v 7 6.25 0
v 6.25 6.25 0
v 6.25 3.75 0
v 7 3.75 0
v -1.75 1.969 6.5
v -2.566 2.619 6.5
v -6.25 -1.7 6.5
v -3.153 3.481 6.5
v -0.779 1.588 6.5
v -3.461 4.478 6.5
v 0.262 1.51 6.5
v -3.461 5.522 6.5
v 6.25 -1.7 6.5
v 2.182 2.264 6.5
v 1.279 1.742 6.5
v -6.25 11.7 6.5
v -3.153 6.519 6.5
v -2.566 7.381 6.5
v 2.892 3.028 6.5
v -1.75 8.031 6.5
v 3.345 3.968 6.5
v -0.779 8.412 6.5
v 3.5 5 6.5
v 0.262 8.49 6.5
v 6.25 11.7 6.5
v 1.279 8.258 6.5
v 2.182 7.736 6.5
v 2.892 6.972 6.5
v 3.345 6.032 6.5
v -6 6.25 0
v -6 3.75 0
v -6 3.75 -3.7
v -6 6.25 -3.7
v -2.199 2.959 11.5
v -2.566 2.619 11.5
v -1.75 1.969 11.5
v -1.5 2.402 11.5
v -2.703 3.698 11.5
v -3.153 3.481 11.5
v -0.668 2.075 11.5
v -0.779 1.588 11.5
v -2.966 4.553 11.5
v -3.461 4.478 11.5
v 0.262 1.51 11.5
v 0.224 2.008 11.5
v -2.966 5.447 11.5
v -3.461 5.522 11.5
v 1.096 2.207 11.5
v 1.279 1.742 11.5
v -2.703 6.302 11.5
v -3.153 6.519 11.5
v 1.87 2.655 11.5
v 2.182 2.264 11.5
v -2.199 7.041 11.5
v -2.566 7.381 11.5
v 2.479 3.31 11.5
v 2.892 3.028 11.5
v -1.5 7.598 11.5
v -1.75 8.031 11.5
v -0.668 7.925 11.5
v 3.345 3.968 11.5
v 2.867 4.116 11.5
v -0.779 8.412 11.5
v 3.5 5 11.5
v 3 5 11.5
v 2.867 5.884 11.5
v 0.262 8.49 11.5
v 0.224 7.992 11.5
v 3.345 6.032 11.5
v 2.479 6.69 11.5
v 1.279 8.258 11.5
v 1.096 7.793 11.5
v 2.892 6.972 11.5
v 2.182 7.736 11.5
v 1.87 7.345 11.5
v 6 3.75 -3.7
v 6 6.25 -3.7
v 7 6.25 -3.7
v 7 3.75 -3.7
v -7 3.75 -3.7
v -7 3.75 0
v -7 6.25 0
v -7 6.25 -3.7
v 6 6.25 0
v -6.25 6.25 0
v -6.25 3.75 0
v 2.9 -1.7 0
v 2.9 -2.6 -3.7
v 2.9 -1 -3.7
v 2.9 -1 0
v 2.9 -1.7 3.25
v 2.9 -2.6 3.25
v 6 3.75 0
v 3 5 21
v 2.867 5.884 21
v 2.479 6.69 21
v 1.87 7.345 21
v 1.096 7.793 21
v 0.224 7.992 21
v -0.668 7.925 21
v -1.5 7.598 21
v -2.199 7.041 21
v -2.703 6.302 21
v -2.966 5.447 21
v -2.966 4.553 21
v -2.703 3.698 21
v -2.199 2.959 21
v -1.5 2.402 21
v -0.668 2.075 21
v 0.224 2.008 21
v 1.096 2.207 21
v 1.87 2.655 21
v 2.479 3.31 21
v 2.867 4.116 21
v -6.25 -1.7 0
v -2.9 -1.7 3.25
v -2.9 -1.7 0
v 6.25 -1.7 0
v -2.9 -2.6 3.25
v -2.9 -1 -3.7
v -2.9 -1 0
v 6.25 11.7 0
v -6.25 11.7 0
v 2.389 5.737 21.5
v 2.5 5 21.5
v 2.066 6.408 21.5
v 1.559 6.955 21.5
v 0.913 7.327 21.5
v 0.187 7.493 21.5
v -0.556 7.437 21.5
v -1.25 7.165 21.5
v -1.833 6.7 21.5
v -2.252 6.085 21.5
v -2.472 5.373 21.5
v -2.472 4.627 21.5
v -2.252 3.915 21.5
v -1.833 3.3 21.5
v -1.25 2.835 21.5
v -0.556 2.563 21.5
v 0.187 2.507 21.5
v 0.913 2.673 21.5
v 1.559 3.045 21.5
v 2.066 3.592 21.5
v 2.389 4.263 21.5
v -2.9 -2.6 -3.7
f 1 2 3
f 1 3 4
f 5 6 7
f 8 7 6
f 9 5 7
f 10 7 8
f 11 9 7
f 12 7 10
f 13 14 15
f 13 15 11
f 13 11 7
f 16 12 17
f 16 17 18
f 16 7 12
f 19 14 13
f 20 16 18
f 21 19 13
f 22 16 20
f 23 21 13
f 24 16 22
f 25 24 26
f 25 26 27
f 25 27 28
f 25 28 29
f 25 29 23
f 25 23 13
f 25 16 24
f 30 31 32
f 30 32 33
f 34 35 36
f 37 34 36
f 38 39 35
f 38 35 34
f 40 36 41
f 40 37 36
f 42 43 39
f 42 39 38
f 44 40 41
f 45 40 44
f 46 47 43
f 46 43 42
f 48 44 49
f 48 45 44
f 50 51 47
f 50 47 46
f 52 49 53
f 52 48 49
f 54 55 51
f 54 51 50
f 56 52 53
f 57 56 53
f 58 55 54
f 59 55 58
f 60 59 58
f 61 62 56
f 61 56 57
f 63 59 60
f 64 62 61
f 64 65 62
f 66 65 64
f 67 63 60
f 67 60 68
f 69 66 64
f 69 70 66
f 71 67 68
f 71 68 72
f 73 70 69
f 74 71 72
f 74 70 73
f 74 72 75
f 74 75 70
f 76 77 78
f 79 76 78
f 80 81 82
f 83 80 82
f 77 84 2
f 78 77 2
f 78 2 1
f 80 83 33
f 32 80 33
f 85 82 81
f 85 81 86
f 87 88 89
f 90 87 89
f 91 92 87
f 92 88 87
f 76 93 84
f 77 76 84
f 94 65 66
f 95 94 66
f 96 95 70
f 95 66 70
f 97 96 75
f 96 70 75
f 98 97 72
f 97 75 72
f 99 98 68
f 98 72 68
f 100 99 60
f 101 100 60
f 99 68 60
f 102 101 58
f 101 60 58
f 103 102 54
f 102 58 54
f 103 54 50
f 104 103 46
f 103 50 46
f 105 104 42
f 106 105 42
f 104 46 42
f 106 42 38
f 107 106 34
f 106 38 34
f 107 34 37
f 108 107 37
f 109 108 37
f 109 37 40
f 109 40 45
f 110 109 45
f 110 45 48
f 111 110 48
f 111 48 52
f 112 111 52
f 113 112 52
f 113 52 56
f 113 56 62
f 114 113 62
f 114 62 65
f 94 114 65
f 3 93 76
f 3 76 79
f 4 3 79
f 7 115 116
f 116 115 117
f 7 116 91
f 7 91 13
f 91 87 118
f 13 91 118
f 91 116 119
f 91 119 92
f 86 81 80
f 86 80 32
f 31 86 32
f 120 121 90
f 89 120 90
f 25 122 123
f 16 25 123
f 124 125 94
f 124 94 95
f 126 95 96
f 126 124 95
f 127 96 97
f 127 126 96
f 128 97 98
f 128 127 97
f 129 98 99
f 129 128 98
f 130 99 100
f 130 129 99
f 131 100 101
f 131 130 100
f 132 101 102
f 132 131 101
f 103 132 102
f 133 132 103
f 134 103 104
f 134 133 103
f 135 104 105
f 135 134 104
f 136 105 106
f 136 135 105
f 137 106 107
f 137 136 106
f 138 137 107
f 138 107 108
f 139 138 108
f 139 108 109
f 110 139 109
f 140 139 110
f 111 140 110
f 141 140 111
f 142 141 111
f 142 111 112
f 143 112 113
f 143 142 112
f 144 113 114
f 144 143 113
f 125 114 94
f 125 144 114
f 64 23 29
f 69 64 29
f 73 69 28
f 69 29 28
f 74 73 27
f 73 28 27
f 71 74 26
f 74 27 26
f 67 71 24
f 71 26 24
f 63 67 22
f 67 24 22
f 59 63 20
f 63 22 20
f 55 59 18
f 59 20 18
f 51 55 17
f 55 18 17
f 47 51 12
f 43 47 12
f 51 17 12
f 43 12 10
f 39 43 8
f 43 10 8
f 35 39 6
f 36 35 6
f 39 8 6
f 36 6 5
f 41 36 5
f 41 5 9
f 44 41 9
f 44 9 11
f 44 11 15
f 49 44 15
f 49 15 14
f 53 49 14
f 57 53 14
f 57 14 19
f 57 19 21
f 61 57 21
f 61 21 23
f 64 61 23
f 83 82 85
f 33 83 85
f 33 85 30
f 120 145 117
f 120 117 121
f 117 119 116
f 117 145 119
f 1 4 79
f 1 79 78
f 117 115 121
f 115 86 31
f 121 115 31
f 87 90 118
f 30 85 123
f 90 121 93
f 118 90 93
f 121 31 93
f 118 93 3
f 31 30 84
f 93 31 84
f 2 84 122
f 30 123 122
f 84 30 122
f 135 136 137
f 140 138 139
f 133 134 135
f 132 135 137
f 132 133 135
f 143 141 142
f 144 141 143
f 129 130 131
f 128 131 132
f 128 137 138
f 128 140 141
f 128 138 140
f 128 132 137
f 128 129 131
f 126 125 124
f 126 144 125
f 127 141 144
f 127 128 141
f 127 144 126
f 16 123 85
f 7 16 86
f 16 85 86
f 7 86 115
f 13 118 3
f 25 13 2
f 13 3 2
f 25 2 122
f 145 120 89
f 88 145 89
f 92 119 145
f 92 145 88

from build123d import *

# Parameters (mm, degrees)
F3_DEPTH       = 6.5
F1_R           = 3.5
F4_DEPTH       = 11.5
F2_R           = 3
F5_DEPTH       = 21.5
F6_SIZE        = 0.5
F7_W           = 1
F7_H           = 2.5
F8_DEPTH       = 3.7
F9_W           = 5.8
F9_H           = 1.6
F10_DEPTH      = 3.25
F10_DEPTH_BACK = 3.7


with BuildPart() as f3:
    # F0 (on Top) → F3 (new body)
    with BuildSketch(Plane.XY):
        Polygon((0, 11.7), (-6.25, 11.7), (-6.25, -1.7), (6.25, -1.7), (6.25, 5), (6.25, 11.7), align=None)
    extrude(amount=F3_DEPTH)

    # F1 (on Top) → F4 (join)
    with BuildSketch(Plane.XY):
        with Locations((0, 5)):
            Circle(F1_R)
    extrude(amount=F4_DEPTH)

    # F2 (on Top) → F5 (join)
    with BuildSketch(Plane.XY):
        with Locations((0, 5)):
            Circle(F2_R)
    extrude(amount=F5_DEPTH)

    # F6
    f6_edges = [f3.edges().sort_by_distance(p)[0] for p in [
        (-3, 5, 21.5),
    ]]
    chamfer(f6_edges, length=F6_SIZE)

    # F7 (on Top) → F8 (join)
    with BuildSketch(Plane.XY):
        with Locations((-6.5, 5)):
            Rectangle(F7_W, F7_H)
        with Locations((6.5, 5)):
            Rectangle(F7_W, F7_H)
    extrude(amount=-F8_DEPTH)

    # F9 (on Top) → F10 (join, two sides)
    with BuildSketch(Plane.XY) as f10_sk:
        with Locations((0, -1.8)):
            Rectangle(F9_W, F9_H)
    extrude(amount=F10_DEPTH)
    extrude(f10_sk.sketch, amount=-F10_DEPTH_BACK)


solid = f3.part
